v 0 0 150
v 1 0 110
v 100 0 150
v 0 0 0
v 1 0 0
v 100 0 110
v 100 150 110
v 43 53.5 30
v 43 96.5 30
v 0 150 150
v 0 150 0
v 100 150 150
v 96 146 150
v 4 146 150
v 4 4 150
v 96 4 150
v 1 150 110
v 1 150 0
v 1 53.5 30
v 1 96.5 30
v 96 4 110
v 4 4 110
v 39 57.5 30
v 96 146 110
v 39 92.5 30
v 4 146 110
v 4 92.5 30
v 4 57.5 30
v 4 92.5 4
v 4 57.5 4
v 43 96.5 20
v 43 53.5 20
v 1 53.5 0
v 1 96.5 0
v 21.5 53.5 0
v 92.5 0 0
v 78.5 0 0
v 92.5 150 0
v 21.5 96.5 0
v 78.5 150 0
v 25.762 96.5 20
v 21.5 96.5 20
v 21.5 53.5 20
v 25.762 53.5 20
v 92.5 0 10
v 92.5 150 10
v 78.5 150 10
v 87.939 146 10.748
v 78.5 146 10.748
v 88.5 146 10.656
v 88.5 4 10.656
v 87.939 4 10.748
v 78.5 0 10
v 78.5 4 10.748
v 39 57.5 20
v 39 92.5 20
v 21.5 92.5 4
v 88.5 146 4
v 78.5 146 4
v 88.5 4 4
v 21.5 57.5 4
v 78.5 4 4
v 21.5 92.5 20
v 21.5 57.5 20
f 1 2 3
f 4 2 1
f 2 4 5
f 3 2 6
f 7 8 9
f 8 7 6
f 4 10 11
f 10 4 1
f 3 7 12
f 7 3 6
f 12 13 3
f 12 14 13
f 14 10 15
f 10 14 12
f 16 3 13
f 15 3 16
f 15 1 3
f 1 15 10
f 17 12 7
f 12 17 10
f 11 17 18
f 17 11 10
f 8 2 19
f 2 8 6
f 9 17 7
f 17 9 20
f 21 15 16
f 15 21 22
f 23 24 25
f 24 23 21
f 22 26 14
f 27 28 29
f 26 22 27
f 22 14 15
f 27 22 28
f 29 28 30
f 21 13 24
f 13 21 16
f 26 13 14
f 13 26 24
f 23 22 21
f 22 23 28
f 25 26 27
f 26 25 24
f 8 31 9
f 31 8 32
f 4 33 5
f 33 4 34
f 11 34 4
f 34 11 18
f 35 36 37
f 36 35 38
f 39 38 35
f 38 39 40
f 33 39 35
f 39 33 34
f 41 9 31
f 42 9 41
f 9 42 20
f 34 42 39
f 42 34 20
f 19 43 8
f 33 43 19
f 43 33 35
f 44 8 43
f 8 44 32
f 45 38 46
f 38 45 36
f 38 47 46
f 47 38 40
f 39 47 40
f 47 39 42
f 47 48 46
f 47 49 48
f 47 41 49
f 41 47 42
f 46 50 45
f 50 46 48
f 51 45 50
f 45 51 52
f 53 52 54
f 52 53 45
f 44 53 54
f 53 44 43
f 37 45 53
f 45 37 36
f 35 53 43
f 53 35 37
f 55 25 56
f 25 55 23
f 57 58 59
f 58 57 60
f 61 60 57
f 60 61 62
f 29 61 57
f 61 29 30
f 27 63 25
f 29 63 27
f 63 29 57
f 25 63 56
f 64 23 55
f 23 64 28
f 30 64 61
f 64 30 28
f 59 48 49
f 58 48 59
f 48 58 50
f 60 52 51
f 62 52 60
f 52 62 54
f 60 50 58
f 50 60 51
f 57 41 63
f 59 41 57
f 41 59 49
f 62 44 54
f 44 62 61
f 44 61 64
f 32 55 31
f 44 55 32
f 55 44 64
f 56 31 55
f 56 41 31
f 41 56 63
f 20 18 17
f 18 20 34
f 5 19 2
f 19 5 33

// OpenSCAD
height=150;
width=150;
depth=100;

wall_width=4;

neck_width=35;
neck_dish_offset=10;

neck_main_slope=80;

dish_height=20;
dish_width=wall_width;

cube([1,width,height]);


difference() {
    hull() {
    //outter bottom neck
    translate([0,(width-neck_width)/2-wall_width,dish_height+neck_dish_offset]) cube([neck_width+2*wall_width,neck_width+2*wall_width,10]);
    //mid outter
    translate([0,0,dish_height+neck_dish_offset+neck_main_slope]) cube([depth,width,10]);
    //top outter
    translate([0,0,height-10]) cube([depth,width,10]);
    }
    
    hull() {
    //inner bottom neck
    translate([wall_width,(width-neck_width)/2,dish_height+neck_dish_offset]) cube([neck_width,neck_width,10]);
    //mid inner
    translate([wall_width,wall_width,dish_height+neck_dish_offset+neck_main_slope]) cube([depth-2*wall_width,width-2*wall_width,10]);
    //top inner
    translate([wall_width,wall_width,height-10]) cube([depth-2*wall_width,width-2*wall_width,10]);
    }
}

difference() {
union() {
//dish neck drop outter
translate([0,(width-neck_width)/2-wall_width,0]) cube([neck_width+2*wall_width,neck_width+2*wall_width,dish_height+neck_dish_offset]);
translate([-neck_width/2,0,0]) hull() {
//dish neck drop neck outter
translate([neck_width+wall_width,(width-neck_width)/2-wall_width,0]) cube([10,neck_width+2*wall_width,dish_height]);
//dish front 
translate([depth-wall_width,0,0]) cube([10+wall_width,width,dish_height/2]);
}
}
union() {
//dish neck drop
translate([wall_width,(width-neck_width)/2,dish_width]) cube([neck_width,neck_width,dish_height-dish_width+neck_dish_offset]);
translate([-neck_width/2,0,0]) hull() {
//dish neck drop neck outter
translate([neck_width+wall_width,(width-neck_width)/2,dish_width]) cube([10,neck_width,dish_height-dish_width]);
//dish front 
translate([depth-wall_width,wall_width,dish_width]) cube([10,width-2*wall_width,dish_height-dish_width]);
}
}


}

//the dish
difference() {
    //cube([depth,width,dish_height]);
    //translate([dish_width,dish_width,dish_width]) cube([depth-dish_width*2,width-dish_width*2,dish_height-dish_width]);
}
